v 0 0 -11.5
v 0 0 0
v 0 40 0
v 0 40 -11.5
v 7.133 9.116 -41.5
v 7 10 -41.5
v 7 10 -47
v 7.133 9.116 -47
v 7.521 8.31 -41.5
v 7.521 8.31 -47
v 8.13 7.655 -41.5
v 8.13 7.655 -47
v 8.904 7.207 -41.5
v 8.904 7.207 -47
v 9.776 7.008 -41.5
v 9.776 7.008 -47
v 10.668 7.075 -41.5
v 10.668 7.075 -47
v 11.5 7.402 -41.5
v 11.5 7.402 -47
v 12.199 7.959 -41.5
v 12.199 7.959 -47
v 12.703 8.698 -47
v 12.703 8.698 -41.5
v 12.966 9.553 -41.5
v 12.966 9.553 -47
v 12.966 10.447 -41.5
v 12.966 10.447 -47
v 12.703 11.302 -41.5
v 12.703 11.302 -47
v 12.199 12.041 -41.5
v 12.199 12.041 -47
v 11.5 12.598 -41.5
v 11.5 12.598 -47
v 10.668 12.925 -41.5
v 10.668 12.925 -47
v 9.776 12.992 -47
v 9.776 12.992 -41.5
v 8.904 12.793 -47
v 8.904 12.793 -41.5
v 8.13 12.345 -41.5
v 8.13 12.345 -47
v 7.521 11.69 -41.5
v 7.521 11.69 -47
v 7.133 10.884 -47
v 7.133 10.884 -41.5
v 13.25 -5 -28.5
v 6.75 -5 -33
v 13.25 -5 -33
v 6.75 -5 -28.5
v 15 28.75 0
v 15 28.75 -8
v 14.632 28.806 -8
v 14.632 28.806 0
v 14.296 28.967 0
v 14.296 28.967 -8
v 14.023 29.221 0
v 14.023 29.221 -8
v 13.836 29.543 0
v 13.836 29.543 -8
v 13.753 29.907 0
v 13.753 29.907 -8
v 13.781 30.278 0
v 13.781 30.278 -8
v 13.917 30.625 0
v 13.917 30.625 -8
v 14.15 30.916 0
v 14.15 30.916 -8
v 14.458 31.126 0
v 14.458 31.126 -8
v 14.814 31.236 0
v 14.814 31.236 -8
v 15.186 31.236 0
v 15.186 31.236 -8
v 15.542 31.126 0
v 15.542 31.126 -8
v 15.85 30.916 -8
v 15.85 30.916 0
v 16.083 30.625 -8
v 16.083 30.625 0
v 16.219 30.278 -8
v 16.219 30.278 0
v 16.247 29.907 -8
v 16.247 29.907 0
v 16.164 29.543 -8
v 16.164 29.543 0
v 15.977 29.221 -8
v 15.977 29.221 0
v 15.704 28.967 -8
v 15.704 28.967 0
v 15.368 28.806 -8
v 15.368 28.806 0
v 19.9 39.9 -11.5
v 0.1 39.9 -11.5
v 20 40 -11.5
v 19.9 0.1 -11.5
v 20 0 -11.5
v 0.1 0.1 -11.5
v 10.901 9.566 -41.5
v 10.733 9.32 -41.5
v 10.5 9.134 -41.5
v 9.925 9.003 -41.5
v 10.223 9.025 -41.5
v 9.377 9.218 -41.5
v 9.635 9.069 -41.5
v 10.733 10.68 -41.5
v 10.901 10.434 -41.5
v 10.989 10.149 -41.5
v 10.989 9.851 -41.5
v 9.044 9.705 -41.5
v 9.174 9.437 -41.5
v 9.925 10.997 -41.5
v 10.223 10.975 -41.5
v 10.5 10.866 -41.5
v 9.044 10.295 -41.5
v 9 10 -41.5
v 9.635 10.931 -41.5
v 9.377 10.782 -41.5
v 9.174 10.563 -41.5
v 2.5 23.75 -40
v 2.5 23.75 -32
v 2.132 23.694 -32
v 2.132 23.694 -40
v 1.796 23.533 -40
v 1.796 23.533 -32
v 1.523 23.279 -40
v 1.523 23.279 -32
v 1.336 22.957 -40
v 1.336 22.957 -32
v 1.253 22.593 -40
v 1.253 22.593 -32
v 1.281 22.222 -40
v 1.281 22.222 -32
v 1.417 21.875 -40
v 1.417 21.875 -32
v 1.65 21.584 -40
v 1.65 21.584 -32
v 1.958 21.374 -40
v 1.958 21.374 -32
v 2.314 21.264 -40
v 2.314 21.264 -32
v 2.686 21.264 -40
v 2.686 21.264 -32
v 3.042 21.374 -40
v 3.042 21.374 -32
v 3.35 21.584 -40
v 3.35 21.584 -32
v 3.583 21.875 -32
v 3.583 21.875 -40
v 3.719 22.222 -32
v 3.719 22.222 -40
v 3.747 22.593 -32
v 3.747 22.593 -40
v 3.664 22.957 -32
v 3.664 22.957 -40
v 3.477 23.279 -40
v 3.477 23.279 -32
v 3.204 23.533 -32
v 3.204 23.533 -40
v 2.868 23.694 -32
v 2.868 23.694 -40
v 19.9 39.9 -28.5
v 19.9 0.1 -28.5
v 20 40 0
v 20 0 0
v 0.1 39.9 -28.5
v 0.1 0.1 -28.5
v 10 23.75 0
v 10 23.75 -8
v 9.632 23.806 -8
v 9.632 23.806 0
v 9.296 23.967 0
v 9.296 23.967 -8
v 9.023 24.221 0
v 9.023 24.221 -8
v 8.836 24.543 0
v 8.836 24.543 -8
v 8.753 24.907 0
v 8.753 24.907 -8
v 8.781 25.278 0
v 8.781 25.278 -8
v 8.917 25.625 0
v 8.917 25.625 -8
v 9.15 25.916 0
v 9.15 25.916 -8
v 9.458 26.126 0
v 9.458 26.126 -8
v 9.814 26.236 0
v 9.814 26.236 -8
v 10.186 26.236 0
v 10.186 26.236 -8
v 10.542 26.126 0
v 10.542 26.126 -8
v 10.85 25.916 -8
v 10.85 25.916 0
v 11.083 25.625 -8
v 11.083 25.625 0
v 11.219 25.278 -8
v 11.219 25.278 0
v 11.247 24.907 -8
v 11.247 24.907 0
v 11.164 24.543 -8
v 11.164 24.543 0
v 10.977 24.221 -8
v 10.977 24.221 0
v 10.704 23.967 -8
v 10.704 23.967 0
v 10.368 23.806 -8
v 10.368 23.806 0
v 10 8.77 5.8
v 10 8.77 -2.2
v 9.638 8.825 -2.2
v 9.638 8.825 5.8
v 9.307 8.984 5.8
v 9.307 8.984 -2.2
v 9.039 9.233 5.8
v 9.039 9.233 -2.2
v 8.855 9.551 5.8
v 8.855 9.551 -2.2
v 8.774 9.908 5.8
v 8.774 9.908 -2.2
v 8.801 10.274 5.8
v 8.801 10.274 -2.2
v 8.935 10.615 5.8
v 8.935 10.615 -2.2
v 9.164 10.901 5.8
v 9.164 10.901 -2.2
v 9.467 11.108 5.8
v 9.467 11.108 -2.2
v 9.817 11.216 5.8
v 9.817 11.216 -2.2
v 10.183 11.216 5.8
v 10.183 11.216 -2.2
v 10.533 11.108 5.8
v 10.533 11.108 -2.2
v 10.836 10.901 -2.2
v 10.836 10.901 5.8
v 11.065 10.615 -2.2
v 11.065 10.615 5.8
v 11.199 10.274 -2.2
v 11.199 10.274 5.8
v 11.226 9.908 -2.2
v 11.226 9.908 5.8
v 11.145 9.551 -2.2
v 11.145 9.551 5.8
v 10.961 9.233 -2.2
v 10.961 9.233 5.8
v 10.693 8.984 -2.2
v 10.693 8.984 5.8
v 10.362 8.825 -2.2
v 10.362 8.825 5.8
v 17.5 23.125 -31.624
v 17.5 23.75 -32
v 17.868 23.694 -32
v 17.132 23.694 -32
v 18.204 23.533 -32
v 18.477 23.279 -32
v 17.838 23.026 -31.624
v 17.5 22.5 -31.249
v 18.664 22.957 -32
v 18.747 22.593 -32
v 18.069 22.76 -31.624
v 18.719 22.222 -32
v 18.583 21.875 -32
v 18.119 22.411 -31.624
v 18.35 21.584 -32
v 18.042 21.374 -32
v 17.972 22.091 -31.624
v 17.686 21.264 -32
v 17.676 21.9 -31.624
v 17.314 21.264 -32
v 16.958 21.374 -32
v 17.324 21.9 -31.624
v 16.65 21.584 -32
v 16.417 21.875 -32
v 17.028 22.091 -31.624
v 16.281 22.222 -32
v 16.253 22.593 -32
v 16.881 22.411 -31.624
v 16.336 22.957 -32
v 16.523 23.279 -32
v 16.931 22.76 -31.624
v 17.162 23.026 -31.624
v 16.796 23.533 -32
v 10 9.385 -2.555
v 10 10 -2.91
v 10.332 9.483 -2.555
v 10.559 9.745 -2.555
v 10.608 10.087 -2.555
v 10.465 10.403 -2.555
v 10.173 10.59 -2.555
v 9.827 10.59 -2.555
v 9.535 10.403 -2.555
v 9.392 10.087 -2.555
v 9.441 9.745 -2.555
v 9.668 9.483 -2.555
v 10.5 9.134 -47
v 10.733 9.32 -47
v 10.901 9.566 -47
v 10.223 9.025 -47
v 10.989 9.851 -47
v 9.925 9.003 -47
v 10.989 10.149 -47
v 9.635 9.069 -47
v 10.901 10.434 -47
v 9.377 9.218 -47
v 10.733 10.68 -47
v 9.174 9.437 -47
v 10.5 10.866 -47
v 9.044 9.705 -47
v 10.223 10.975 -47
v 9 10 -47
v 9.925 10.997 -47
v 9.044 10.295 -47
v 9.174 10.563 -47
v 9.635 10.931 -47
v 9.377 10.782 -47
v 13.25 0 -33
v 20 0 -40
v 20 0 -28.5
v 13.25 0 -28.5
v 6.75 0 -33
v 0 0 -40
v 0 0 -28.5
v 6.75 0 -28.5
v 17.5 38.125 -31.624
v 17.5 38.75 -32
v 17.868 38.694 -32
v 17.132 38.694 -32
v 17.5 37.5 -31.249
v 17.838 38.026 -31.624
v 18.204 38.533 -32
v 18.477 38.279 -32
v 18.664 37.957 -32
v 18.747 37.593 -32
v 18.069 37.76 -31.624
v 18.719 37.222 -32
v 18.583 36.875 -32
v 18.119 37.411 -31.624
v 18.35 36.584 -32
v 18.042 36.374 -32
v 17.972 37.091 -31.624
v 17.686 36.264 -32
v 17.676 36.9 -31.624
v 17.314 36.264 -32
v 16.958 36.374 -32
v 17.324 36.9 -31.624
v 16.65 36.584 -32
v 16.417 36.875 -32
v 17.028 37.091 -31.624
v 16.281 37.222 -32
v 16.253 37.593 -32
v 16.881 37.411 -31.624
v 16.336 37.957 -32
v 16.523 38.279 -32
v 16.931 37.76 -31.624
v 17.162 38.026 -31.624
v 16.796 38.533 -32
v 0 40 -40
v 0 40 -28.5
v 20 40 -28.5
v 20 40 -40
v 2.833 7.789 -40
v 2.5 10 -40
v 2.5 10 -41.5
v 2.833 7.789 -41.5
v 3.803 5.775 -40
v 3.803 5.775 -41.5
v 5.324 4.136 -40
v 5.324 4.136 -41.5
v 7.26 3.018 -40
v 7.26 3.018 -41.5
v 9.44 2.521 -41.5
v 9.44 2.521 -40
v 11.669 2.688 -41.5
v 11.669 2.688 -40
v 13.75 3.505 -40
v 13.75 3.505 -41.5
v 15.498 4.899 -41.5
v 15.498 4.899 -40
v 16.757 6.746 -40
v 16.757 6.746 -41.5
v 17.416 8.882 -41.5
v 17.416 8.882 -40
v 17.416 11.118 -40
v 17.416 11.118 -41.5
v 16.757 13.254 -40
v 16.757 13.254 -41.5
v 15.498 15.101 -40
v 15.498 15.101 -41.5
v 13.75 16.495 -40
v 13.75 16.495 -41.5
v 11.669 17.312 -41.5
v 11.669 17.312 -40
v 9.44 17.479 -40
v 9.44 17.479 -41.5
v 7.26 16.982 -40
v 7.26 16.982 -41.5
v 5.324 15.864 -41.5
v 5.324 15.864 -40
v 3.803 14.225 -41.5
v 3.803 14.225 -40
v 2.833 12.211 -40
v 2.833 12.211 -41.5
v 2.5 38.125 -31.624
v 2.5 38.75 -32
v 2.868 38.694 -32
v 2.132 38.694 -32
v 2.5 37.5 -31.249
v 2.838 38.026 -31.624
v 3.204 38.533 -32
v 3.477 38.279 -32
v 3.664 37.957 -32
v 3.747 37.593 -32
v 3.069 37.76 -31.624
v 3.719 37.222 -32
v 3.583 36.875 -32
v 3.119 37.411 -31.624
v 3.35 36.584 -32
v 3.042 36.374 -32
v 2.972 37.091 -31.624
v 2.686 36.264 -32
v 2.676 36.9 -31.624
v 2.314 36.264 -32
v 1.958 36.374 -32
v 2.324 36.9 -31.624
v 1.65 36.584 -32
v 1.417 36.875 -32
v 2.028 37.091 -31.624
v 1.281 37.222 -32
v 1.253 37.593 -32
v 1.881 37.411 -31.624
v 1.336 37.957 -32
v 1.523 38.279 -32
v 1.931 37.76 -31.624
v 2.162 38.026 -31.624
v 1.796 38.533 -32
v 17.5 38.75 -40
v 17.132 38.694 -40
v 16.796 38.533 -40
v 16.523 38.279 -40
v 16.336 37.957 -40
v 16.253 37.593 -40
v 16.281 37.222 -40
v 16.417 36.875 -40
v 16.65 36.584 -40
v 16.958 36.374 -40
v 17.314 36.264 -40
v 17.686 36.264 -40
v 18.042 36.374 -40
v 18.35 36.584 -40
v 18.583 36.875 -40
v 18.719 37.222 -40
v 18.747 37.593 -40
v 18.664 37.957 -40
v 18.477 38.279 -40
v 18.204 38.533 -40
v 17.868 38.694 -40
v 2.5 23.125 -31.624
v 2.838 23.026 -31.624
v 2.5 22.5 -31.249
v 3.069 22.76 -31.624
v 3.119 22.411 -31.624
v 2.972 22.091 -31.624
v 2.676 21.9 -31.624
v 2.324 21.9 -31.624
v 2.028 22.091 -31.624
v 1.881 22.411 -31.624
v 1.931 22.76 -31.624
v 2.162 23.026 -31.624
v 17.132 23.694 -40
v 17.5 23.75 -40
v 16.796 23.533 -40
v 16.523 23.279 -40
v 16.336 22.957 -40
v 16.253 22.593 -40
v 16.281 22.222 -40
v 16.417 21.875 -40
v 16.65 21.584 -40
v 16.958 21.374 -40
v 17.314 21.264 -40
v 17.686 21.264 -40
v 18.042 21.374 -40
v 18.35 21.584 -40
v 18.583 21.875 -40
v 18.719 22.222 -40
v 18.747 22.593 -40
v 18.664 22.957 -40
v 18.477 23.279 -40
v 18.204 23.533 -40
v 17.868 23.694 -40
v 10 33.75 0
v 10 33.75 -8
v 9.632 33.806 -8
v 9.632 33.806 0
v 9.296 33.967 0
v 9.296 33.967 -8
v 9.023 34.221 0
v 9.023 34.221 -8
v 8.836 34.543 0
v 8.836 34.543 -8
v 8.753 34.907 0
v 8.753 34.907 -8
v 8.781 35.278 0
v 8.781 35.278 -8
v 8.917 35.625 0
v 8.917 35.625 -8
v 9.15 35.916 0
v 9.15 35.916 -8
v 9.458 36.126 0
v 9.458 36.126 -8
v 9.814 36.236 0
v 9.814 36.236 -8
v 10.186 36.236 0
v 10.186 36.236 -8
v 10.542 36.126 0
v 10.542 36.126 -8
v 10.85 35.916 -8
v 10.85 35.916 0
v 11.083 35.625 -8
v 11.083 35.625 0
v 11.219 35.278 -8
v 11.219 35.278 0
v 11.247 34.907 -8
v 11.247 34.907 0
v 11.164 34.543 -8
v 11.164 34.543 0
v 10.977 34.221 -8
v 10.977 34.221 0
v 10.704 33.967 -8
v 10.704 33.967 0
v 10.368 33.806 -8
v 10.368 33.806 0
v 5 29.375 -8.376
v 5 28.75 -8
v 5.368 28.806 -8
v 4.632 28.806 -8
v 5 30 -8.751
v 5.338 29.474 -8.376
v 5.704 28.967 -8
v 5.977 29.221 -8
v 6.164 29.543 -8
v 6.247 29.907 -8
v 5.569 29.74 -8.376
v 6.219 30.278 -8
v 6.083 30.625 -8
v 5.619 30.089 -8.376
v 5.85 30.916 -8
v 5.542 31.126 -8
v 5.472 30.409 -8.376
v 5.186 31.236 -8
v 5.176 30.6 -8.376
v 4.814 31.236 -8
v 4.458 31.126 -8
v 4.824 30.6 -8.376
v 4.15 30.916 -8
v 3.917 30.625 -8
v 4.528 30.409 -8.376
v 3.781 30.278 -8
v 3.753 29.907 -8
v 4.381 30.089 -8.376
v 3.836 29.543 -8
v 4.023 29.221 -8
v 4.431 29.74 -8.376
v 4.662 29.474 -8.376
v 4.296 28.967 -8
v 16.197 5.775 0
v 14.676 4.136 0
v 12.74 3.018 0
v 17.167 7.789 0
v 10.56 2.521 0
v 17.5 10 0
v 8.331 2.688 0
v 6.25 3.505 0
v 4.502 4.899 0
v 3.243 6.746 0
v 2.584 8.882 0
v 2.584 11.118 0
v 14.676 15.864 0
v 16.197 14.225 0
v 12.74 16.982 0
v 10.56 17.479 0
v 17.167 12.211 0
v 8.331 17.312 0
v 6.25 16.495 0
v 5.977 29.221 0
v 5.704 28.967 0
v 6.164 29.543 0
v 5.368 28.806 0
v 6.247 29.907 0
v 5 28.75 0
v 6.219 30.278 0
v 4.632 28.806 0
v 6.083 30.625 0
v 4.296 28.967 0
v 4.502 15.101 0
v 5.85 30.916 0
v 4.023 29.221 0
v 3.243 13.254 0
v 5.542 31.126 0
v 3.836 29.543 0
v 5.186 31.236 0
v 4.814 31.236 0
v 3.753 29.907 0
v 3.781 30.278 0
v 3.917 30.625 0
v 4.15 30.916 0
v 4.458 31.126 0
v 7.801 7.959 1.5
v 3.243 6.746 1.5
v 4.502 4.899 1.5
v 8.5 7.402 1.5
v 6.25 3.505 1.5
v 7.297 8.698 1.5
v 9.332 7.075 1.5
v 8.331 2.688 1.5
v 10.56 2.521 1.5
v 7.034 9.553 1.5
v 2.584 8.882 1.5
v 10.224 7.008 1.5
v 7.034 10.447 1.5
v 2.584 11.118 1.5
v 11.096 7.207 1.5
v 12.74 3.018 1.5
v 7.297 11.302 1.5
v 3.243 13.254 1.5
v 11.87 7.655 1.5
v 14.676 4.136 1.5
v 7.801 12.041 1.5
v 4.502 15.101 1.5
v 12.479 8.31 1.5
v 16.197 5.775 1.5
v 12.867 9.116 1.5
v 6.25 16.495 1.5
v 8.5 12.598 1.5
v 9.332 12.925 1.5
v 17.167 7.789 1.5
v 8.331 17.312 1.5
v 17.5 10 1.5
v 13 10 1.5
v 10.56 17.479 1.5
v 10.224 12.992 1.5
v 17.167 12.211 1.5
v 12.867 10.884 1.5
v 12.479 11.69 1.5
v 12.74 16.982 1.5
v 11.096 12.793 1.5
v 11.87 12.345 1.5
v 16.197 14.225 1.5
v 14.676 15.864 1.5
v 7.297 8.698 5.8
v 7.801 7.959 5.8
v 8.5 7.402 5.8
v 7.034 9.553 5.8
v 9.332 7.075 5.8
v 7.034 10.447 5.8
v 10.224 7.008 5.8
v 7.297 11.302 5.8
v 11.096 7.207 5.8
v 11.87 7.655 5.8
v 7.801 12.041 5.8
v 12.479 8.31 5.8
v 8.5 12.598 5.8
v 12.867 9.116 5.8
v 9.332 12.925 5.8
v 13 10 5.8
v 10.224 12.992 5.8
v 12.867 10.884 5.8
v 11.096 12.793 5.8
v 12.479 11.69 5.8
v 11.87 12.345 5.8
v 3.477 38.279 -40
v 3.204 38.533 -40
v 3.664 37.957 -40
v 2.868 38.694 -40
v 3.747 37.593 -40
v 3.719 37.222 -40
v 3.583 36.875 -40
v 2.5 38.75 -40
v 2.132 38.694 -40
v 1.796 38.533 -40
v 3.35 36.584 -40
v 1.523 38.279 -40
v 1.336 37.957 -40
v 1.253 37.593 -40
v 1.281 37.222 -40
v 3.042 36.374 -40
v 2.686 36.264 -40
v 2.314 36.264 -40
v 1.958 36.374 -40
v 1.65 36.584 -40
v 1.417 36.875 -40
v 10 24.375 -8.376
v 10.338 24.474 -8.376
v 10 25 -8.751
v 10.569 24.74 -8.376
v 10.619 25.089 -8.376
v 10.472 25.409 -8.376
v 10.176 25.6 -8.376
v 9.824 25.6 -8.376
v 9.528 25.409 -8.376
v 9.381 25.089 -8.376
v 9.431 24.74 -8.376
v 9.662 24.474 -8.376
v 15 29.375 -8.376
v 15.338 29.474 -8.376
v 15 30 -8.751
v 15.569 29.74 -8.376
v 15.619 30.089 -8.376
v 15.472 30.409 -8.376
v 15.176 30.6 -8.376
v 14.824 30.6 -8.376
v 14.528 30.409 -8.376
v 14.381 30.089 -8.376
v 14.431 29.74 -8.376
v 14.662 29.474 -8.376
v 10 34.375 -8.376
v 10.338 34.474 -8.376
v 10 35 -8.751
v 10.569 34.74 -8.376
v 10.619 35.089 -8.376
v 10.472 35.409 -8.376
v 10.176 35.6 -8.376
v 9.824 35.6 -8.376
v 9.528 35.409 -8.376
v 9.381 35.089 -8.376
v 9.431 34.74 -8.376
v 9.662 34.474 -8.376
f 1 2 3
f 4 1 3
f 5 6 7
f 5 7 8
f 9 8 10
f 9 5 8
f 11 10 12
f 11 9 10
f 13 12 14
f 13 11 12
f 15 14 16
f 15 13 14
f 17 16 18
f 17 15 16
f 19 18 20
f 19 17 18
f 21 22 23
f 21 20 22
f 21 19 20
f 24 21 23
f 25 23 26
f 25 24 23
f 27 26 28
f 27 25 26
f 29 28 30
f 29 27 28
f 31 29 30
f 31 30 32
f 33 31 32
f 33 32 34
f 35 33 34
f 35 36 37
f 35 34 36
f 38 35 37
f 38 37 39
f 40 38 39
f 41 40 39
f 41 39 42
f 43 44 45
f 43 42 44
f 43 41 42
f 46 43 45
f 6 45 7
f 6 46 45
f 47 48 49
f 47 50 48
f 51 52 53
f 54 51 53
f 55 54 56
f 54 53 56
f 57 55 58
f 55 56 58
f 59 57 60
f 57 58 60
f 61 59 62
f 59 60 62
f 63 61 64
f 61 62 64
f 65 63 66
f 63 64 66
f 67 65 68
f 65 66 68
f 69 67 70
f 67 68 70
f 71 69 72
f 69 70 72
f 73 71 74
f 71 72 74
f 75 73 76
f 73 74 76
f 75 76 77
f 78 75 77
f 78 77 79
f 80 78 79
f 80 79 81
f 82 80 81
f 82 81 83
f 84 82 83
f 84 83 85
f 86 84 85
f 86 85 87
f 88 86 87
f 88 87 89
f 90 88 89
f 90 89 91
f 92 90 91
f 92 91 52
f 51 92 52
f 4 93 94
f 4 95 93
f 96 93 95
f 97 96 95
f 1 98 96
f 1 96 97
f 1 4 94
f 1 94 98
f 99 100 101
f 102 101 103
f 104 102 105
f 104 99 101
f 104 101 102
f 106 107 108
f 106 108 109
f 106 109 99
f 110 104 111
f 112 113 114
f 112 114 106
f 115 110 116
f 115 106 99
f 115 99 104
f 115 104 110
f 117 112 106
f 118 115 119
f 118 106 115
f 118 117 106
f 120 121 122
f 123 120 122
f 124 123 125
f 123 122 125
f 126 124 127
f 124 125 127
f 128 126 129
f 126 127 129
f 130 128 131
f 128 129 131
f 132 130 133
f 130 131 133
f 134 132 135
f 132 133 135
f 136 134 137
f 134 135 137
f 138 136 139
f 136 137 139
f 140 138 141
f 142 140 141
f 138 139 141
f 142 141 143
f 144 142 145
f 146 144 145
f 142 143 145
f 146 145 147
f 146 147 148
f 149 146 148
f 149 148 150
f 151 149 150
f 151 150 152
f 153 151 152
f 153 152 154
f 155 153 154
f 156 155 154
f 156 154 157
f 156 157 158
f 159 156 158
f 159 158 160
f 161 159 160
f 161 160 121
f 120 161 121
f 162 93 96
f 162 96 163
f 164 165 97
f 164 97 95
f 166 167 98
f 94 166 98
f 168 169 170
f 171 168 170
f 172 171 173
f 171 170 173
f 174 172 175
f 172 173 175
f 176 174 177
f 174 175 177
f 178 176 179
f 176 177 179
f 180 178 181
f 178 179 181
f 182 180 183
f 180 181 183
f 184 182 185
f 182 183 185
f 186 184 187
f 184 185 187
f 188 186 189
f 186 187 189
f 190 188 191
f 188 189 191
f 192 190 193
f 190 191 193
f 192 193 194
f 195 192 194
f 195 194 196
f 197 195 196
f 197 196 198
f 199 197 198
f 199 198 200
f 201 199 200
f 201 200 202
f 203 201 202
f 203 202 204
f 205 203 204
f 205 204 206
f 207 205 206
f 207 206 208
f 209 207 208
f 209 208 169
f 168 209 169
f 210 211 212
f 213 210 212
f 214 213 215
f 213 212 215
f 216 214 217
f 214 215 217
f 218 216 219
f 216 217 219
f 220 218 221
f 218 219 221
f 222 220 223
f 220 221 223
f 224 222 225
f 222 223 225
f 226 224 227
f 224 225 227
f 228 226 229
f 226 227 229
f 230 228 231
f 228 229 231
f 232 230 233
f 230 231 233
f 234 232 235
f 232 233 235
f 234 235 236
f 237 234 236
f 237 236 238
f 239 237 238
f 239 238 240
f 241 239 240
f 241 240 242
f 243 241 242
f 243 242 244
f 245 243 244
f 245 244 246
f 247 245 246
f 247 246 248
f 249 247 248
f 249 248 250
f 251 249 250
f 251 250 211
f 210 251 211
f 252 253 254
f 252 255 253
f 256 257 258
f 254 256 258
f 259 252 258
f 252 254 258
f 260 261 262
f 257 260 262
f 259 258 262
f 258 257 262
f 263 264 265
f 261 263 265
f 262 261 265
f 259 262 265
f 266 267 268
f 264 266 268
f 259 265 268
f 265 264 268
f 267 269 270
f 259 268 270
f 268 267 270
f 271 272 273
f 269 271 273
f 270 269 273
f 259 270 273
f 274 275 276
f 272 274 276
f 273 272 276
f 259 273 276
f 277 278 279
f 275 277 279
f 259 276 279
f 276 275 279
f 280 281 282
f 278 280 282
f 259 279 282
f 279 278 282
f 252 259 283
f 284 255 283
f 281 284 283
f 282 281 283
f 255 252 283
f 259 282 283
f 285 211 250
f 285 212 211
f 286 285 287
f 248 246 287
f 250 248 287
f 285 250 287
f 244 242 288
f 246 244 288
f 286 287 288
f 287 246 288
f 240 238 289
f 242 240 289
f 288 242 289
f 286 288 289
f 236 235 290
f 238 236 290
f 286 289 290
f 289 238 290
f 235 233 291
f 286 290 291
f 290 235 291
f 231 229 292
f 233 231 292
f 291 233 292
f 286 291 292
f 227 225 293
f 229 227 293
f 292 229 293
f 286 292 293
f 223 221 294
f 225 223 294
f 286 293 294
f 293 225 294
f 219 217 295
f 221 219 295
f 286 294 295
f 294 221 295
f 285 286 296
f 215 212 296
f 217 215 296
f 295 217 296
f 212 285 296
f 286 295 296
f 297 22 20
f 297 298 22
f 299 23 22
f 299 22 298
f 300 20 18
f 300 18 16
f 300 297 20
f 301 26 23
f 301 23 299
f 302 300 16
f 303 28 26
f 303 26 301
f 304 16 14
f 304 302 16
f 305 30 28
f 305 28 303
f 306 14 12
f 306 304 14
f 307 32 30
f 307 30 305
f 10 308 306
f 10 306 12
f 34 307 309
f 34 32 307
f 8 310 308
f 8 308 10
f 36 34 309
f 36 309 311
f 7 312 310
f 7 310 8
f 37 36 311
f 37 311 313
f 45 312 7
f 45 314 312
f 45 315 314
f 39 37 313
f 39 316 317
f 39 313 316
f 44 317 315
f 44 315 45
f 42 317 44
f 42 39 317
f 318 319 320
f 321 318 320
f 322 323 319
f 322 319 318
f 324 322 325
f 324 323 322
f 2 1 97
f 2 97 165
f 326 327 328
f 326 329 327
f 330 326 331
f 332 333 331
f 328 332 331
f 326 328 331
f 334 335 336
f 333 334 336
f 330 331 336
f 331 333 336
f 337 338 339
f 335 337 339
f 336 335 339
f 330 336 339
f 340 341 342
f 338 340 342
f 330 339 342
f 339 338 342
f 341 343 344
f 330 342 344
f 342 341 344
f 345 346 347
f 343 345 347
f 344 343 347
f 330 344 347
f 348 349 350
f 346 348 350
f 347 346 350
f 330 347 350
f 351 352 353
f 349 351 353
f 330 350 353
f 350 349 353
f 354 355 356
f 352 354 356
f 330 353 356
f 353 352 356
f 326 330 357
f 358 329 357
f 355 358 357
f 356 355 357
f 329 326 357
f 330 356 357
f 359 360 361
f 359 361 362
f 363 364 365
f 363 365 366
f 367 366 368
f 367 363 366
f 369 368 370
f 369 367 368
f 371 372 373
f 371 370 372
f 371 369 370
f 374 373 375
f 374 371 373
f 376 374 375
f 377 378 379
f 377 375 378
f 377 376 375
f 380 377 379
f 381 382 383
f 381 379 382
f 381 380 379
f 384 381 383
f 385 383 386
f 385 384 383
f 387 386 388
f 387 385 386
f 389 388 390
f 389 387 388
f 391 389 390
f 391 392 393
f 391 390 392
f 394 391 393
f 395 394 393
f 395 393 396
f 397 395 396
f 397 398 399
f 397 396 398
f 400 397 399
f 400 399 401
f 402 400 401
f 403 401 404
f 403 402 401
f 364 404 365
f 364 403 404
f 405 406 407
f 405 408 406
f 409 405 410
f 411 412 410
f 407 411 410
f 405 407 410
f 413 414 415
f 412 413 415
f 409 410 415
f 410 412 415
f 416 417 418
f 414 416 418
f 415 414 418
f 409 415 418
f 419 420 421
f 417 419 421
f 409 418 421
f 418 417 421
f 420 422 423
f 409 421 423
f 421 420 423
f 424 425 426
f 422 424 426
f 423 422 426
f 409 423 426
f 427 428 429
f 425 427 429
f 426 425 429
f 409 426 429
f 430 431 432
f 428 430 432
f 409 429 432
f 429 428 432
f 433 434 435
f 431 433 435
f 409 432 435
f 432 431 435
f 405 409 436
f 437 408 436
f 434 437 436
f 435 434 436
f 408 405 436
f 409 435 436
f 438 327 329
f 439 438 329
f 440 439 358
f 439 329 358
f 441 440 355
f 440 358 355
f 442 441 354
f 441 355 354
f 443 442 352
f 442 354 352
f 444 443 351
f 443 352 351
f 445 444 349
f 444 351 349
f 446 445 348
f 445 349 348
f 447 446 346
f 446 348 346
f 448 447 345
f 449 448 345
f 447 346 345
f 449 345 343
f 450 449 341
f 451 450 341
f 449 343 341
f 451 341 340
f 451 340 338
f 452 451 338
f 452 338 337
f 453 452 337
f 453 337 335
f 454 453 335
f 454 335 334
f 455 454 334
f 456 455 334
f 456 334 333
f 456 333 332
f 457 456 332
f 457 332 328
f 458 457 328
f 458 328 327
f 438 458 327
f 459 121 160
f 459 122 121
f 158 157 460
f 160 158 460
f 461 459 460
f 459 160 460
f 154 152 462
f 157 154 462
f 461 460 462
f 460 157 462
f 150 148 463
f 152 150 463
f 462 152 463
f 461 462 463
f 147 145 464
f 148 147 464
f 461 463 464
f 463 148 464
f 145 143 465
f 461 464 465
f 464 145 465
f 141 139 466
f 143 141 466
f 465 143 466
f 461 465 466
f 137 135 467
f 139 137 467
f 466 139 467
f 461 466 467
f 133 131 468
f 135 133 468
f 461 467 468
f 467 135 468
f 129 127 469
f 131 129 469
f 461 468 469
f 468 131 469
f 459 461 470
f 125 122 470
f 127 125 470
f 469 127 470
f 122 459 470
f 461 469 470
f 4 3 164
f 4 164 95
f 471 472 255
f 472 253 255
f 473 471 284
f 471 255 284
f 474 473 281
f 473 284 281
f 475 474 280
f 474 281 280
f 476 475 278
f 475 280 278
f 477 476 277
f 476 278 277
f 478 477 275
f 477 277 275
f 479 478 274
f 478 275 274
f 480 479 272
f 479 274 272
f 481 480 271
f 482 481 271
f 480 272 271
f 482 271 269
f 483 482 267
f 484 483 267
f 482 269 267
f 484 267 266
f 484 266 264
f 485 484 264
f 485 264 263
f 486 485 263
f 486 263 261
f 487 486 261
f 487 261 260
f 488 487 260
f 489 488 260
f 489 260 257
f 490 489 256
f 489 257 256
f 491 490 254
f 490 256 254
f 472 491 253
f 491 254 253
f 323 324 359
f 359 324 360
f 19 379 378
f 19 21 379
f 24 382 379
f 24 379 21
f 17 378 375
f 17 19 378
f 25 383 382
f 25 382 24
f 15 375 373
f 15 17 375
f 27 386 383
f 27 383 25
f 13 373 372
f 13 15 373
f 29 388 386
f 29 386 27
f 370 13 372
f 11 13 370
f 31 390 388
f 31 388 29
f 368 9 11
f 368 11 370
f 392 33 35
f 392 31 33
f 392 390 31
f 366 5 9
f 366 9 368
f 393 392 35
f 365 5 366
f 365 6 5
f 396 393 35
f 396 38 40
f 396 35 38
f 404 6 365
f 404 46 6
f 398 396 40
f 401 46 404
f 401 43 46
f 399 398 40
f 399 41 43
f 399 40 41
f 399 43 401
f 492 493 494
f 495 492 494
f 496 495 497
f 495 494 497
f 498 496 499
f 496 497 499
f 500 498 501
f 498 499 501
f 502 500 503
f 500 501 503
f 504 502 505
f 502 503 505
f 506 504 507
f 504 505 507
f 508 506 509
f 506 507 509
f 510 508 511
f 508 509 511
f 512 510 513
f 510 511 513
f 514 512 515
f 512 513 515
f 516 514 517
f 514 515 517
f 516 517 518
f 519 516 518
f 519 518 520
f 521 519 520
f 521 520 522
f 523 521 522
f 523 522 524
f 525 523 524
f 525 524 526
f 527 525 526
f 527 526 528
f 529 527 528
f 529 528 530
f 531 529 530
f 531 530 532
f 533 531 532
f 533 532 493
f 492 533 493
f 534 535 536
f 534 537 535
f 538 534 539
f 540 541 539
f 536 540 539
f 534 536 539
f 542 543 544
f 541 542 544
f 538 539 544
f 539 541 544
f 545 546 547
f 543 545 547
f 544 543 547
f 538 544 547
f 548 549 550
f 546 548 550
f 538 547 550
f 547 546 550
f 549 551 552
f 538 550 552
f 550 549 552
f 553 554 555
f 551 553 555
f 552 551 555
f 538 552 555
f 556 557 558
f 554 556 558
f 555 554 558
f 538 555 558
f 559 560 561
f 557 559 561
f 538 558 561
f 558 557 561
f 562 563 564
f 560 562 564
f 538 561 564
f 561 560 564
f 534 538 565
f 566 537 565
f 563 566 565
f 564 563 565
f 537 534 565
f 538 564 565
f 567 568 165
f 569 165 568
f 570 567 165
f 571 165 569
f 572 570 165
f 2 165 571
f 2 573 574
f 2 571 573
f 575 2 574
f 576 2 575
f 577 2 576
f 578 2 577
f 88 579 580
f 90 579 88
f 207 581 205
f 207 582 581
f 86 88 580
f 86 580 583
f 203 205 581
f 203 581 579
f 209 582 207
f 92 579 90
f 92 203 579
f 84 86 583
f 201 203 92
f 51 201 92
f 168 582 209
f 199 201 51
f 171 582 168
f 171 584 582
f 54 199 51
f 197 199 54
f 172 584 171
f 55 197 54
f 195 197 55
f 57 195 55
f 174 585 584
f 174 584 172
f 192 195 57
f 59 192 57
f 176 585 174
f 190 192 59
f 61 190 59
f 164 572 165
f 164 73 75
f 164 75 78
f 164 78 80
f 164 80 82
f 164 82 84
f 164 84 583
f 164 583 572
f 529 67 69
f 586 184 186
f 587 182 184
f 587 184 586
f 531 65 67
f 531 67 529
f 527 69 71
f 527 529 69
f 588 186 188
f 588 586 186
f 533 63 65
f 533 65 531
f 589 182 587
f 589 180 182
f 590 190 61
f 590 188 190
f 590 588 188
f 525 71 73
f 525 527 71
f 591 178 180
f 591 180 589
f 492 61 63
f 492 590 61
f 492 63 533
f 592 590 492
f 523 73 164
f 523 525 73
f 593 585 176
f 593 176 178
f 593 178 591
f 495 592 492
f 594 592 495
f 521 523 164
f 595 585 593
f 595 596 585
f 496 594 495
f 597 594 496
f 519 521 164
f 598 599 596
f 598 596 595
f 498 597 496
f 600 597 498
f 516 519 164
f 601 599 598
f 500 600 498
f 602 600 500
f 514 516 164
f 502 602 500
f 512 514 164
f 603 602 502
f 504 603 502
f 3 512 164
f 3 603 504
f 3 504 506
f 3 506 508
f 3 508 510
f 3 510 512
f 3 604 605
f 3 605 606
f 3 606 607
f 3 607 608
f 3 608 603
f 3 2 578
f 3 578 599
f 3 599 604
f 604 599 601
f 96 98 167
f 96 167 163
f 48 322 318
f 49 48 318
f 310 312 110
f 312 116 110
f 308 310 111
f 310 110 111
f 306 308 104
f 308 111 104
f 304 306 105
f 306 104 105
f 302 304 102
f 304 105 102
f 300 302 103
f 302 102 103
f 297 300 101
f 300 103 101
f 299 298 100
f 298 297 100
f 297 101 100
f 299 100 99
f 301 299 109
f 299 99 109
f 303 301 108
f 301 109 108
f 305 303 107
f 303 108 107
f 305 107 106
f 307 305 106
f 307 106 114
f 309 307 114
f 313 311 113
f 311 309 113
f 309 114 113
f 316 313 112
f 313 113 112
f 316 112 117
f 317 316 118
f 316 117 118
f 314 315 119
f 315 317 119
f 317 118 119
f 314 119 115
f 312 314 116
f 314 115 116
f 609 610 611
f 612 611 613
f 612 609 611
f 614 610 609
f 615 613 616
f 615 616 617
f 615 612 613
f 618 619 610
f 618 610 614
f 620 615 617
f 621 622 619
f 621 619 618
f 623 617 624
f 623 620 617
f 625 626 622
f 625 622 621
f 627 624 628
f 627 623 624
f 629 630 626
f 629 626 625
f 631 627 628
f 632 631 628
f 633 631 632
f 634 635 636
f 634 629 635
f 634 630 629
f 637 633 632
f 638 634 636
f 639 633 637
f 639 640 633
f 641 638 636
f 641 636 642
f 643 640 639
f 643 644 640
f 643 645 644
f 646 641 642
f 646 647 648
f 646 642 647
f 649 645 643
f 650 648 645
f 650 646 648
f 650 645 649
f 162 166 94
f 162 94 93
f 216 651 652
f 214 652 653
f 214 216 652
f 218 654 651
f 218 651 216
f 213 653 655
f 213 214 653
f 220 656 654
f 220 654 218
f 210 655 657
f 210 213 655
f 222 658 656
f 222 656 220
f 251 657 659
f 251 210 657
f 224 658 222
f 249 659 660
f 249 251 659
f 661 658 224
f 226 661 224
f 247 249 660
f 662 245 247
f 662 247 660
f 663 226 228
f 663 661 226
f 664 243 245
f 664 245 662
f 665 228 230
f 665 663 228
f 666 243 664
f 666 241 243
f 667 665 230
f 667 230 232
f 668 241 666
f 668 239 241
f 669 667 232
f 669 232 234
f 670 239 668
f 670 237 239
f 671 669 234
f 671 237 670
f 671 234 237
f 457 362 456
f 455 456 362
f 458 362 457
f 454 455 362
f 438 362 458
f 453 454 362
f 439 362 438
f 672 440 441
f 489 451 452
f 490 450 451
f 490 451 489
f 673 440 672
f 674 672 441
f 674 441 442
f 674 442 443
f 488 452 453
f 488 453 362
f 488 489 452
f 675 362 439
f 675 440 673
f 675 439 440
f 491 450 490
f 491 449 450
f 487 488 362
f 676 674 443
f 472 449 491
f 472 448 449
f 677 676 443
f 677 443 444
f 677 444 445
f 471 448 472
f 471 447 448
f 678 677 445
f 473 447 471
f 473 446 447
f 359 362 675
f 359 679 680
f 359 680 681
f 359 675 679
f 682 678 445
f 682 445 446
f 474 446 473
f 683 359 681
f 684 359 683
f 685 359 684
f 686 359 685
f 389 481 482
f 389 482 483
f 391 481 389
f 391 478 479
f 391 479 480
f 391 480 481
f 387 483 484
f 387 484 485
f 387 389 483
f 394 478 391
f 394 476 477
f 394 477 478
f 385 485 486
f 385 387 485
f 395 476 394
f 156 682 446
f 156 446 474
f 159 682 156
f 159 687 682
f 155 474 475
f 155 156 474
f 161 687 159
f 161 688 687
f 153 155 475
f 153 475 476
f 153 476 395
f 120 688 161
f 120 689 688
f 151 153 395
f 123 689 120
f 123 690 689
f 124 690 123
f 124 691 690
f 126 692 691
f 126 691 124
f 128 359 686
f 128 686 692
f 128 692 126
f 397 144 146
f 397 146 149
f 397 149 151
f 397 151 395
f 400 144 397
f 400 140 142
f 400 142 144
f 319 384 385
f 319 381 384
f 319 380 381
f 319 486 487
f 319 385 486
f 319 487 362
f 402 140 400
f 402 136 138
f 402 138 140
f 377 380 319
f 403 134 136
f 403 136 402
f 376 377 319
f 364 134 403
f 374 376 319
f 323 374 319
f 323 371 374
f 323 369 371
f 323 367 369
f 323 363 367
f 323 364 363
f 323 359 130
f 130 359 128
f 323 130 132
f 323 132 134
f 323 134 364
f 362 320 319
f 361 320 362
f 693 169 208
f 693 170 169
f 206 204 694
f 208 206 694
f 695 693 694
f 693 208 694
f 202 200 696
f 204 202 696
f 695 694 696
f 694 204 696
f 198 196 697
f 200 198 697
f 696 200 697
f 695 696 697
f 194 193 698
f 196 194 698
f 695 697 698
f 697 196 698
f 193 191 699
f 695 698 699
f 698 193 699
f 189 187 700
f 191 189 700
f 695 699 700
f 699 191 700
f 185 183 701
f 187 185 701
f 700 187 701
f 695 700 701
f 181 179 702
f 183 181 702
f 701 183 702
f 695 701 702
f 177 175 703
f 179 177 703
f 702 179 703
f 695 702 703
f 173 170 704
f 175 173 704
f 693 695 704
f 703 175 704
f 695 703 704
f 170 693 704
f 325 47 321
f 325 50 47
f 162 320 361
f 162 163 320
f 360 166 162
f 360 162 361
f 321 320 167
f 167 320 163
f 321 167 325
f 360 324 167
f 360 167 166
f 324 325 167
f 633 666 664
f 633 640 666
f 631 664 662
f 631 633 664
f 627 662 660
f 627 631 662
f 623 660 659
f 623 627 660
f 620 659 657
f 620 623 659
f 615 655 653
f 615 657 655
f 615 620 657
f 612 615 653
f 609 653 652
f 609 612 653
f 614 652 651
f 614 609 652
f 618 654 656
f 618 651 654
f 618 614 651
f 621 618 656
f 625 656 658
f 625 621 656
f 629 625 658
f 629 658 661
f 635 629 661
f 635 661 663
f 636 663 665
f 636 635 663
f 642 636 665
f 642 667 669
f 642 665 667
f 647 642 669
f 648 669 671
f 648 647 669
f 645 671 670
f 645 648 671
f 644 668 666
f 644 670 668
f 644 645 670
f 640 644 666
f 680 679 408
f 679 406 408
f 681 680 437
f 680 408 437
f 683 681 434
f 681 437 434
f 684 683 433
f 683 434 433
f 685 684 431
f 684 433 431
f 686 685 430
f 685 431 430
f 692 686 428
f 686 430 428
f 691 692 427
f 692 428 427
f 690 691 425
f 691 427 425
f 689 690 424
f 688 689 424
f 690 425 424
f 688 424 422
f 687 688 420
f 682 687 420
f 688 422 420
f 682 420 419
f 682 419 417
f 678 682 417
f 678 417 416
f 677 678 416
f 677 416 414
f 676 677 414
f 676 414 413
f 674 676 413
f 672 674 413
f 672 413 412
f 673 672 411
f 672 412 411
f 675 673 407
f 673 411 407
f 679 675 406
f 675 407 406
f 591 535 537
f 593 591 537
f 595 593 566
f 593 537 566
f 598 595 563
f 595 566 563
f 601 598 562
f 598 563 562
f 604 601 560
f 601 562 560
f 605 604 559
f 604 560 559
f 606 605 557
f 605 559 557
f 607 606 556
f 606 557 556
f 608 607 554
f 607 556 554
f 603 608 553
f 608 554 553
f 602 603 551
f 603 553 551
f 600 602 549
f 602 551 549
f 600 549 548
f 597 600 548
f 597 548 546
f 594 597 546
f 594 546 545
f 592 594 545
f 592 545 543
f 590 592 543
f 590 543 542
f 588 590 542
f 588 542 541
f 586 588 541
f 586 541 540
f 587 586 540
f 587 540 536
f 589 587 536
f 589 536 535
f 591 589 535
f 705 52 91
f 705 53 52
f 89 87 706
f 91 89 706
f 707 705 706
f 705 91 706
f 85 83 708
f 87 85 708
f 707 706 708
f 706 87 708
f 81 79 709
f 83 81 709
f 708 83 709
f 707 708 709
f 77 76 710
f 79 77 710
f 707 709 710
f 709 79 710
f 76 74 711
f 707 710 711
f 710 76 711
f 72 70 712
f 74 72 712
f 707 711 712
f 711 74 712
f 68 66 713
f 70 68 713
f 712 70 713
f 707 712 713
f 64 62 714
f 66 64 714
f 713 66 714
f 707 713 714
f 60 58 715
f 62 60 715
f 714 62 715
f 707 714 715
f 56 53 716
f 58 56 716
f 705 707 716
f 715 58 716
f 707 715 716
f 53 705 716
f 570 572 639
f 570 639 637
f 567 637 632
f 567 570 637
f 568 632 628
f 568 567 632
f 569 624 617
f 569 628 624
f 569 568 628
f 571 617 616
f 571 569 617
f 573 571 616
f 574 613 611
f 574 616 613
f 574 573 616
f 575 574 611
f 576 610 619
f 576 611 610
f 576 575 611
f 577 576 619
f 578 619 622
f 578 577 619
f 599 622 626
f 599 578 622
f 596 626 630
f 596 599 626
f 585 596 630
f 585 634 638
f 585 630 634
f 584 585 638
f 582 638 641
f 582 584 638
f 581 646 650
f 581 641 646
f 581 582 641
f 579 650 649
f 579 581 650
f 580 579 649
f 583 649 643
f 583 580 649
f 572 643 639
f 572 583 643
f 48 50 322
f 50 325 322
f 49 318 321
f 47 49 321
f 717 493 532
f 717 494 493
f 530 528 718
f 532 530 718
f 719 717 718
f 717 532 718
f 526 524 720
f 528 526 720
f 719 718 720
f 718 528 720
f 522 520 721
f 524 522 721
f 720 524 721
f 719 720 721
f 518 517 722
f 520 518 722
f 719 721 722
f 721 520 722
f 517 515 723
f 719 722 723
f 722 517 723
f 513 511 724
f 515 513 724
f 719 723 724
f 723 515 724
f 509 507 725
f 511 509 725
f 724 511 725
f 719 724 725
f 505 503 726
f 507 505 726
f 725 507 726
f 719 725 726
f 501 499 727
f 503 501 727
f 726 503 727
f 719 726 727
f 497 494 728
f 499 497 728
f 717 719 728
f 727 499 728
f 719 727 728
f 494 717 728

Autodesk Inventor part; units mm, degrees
ref_plane "YZ Plane" through (0, 0, 0) normal (1, 0, 0) x (0, 1, 0)
ref_plane "XZ Plane" through (0, 0, 0) normal (0, 1, 0) x (-1, 0, 0)
ref_plane "XY Plane" through (0, 0, 0) normal (0, 0, 1) x (1, 0, 0)
sketch "スケッチ1" plane through (0, 0, 0) normal (1, 0, 0) x (0, 1, 0)
  line L0 (0, 0) -> (40, 0)
  line L1 (40, 0) -> (40, -40)
  line L2 (40, -40) -> (0, -40)
  line L3 (0, -40) -> (0, 0)
  dimension "d0" = 40
  dimension "d1" = 40
extrude "押し出し1" add sketch "スケッチ1" along normal blind 20
sketch "スケッチ2" plane through (0, 0, 0) normal (0, 0, 1) x (1, 0, 0)
  circle A0 centre (10, 10) radius 7.5
  line L0 (0, 0) -> (20, 0) projected
  line L1 (0, 40) -> (0, 0) projected
  dimension "d4" = 15
  dimension "d5" = 10
  dimension "d6" = 10
extrude "押し出し2" add sketch "スケッチ2" along normal blind 1.5
sketch "スケッチ3" plane through (0, 0, -40) normal (0, 0, -1) x (-1, 0, 0)
  circle A0 centre (-10, 10) radius 7.5
  line L0 (0, 0) -> (-20, 0) projected
  line L1 (0, 0) -> (0, 40) projected
  dimension "d9" = 15
  dimension "d10" = 10
  dimension "d11" = 10
extrude "押し出し3" add sketch "スケッチ3" along normal blind 1.5
sketch "スケッチ4" plane through (20, 0, 0) normal (1, 0, 0) x (0, 0, -1)
  line L0 (40, 40) -> (0, 40) projected
  line L1 (20, 40) -> (20, 0)
  line L2 (0, 0) -> (40, 0) projected
  line L3 (11.5, 40) -> (28.5, 40)
  line L4 (28.5, 40) -> (28.5, 0)
  line L5 (28.5, 0) -> (11.5, 0)
  line L6 (11.5, 0) -> (11.5, 40)
  dimension "d14" = 17
extrude "押し出し4" cut sketch "スケッチ4" against normal blind 0.1
sketch "スケッチ5" plane through (0, 40, 0) normal (0, 1, 0) x (1, 0, 0)
  line L0 (0, 0) -> (0, 40) projected
  line L1 (0, 20) -> (19.9, 20)
  line L2 (19.9, 11.5) -> (19.9, 28.5) projected
  line L3 (19.9, 11.5) -> (0, 11.5)
  line L4 (0, 11.5) -> (0, 28.5)
  line L5 (0, 28.5) -> (19.9, 28.5)
  line L6 (19.9, 28.5) -> (19.9, 11.5)
extrude "押し出し5" cut sketch "スケッチ5" against normal blind 0.1
sketch "スケッチ6" plane through (0, 0, 0) normal (-1, 0, 0) x (0, 0, 1)
  line L0 (-11.5, 39.9) -> (-28.5, 39.9) projected
  line L1 (-20, 39.9) -> (-20, 0)
  line L2 (-28.5, 0) -> (-11.5, 0) projected
  line L3 (-28.5, 39.9) -> (-11.5, 39.9)
  line L4 (-11.5, 39.9) -> (-11.5, 0)
  line L5 (-11.5, 0) -> (-28.5, 0)
  line L6 (-28.5, 0) -> (-28.5, 39.9)
  point P0 (0, 0)
extrude "押し出し6" cut sketch "スケッチ6" against normal blind 0.1
sketch "スケッチ7" plane through (0, 0, -40) normal (0, -1, 0) x (1, 0, 0)
  line L0 (0.1, 28.5) -> (0.1, 11.5) projected
  line L1 (20, 28.5) -> (0, 28.5) projected
  line L2 (0.1, 11.5) -> (20, 11.5)
  line L3 (20, 11.5) -> (20, 28.5)
  line L4 (20, 28.5) -> (0.1, 28.5)
  line L5 (0.1, 28.5) -> (0.1, 11.5)
  point P0 (0, 40)
extrude "押し出し7" cut sketch "スケッチ7" against normal blind 0.1
sketch "スケッチ8" plane through (0, 0, -40) normal (0, 0, -1) x (-1, 0, 0)
  line L0 (0, 40) -> (-20, 40) projected
  line L1 (-20, 0) -> (-20, 40) projected
  line L2 (0, 0) -> (0, 40) projected
  point P0 (-17.5, 37.5)
  point P1 (-2.5, 37.5)
  point P2 (-2.5, 22.5)
  point P3 (-17.5, 22.5)
  dimension "d23" = 2.5
  dimension "d24" = 2.5
  dimension "d25" = 2.5
  dimension "d26" = 15
hole "穴1" at (17.5, 37.5, -40) at (2.5, 37.5, -40) at (2.5, 22.5, -40) at (17.5, 22.5, -40) direction (0, 0, 1) diameter 2.5 depth 8 tip angle 118
sketch "スケッチ9" plane through (0, 0, 0) normal (0, 0, 1) x (1, 0, 0)
  line L0 (0, 40) -> (20, 40) projected
  line L1 (20, 40) -> (20, 0) projected
  line L2 (0, 40) -> (0, 0) projected
  circle A0 centre (10, 30) radius 5
  point P0 (10, 25)
  point P1 (5, 30)
  point P2 (15, 30)
  point P3 (10, 35)
  dimension "d48" = 10
  dimension "d49" = 10
  dimension "d50" = 10
hole "穴2" at (10, 25, 0) at (5, 30, 0) at (15, 30, 0) at (10, 35, 0) direction (0, 0, -1) diameter 2.5 depth 8 tip angle 118
sketch "スケッチ10" plane through (10, 10, 1.5) normal (0, 0, 1) x (1, 0, 0)
  circle A0 centre (0, 0) radius 7.5 projected
  circle A1 centre (0, 0) radius 3
  point P0 (-10, -10)
  dimension "d45" = 6
extrude "押し出し8" add sketch "スケッチ10" along normal blind 4.3 contours A1
sketch "スケッチ11" plane through (10, 10, -41.5) normal (0, 0, -1) x (-1, 0, 0)
  circle A0 centre (0, 0) radius 7.5 projected
  circle A1 centre (0, 0) radius 3
  circle A2 centre (0, 0) radius 1
  point P0 (10, -10)
  dimension "d51" = 6
  dimension "d54" = 2
extrude "押し出し9" add sketch "スケッチ11" along normal blind 5.5 contours A1
sketch "スケッチ12" plane through (0, 0, -40) normal (0, -1, 0) x (1, 0, 0)
  line L0 (20, 11.5) -> (0, 11.5) projected
  line L1 (13.25, 11.5) -> (6.75, 11.5)
  line L2 (6.75, 11.5) -> (6.75, 7)
  line L3 (6.75, 7) -> (13.25, 7)
  line L4 (13.25, 7) -> (13.25, 11.5)
  point P0 (0, 40)
  point P1 (6.75, 11.5)
  point P2 (10, 11.5)
  dimension "d55" = 6.5
  dimension "d56" = 4.5
extrude "押し出し10" add sketch "スケッチ12" along normal blind 5
sketch "スケッチ13" plane through (10, 10, 5.8) normal (0, 0, 1) x (1, 0, 0)
  point P0 (0, 0)
hole "穴3" at (10, 10, 5.8) direction (0, 0, -1) diameter 2.459 depth 8 tip angle 120 thread size "M3x0.5" class "6H" standard "ISO Metric profile"
properties part number "サーボモーター25kgcmサーボモータ" material "アルミニウム 6061"
